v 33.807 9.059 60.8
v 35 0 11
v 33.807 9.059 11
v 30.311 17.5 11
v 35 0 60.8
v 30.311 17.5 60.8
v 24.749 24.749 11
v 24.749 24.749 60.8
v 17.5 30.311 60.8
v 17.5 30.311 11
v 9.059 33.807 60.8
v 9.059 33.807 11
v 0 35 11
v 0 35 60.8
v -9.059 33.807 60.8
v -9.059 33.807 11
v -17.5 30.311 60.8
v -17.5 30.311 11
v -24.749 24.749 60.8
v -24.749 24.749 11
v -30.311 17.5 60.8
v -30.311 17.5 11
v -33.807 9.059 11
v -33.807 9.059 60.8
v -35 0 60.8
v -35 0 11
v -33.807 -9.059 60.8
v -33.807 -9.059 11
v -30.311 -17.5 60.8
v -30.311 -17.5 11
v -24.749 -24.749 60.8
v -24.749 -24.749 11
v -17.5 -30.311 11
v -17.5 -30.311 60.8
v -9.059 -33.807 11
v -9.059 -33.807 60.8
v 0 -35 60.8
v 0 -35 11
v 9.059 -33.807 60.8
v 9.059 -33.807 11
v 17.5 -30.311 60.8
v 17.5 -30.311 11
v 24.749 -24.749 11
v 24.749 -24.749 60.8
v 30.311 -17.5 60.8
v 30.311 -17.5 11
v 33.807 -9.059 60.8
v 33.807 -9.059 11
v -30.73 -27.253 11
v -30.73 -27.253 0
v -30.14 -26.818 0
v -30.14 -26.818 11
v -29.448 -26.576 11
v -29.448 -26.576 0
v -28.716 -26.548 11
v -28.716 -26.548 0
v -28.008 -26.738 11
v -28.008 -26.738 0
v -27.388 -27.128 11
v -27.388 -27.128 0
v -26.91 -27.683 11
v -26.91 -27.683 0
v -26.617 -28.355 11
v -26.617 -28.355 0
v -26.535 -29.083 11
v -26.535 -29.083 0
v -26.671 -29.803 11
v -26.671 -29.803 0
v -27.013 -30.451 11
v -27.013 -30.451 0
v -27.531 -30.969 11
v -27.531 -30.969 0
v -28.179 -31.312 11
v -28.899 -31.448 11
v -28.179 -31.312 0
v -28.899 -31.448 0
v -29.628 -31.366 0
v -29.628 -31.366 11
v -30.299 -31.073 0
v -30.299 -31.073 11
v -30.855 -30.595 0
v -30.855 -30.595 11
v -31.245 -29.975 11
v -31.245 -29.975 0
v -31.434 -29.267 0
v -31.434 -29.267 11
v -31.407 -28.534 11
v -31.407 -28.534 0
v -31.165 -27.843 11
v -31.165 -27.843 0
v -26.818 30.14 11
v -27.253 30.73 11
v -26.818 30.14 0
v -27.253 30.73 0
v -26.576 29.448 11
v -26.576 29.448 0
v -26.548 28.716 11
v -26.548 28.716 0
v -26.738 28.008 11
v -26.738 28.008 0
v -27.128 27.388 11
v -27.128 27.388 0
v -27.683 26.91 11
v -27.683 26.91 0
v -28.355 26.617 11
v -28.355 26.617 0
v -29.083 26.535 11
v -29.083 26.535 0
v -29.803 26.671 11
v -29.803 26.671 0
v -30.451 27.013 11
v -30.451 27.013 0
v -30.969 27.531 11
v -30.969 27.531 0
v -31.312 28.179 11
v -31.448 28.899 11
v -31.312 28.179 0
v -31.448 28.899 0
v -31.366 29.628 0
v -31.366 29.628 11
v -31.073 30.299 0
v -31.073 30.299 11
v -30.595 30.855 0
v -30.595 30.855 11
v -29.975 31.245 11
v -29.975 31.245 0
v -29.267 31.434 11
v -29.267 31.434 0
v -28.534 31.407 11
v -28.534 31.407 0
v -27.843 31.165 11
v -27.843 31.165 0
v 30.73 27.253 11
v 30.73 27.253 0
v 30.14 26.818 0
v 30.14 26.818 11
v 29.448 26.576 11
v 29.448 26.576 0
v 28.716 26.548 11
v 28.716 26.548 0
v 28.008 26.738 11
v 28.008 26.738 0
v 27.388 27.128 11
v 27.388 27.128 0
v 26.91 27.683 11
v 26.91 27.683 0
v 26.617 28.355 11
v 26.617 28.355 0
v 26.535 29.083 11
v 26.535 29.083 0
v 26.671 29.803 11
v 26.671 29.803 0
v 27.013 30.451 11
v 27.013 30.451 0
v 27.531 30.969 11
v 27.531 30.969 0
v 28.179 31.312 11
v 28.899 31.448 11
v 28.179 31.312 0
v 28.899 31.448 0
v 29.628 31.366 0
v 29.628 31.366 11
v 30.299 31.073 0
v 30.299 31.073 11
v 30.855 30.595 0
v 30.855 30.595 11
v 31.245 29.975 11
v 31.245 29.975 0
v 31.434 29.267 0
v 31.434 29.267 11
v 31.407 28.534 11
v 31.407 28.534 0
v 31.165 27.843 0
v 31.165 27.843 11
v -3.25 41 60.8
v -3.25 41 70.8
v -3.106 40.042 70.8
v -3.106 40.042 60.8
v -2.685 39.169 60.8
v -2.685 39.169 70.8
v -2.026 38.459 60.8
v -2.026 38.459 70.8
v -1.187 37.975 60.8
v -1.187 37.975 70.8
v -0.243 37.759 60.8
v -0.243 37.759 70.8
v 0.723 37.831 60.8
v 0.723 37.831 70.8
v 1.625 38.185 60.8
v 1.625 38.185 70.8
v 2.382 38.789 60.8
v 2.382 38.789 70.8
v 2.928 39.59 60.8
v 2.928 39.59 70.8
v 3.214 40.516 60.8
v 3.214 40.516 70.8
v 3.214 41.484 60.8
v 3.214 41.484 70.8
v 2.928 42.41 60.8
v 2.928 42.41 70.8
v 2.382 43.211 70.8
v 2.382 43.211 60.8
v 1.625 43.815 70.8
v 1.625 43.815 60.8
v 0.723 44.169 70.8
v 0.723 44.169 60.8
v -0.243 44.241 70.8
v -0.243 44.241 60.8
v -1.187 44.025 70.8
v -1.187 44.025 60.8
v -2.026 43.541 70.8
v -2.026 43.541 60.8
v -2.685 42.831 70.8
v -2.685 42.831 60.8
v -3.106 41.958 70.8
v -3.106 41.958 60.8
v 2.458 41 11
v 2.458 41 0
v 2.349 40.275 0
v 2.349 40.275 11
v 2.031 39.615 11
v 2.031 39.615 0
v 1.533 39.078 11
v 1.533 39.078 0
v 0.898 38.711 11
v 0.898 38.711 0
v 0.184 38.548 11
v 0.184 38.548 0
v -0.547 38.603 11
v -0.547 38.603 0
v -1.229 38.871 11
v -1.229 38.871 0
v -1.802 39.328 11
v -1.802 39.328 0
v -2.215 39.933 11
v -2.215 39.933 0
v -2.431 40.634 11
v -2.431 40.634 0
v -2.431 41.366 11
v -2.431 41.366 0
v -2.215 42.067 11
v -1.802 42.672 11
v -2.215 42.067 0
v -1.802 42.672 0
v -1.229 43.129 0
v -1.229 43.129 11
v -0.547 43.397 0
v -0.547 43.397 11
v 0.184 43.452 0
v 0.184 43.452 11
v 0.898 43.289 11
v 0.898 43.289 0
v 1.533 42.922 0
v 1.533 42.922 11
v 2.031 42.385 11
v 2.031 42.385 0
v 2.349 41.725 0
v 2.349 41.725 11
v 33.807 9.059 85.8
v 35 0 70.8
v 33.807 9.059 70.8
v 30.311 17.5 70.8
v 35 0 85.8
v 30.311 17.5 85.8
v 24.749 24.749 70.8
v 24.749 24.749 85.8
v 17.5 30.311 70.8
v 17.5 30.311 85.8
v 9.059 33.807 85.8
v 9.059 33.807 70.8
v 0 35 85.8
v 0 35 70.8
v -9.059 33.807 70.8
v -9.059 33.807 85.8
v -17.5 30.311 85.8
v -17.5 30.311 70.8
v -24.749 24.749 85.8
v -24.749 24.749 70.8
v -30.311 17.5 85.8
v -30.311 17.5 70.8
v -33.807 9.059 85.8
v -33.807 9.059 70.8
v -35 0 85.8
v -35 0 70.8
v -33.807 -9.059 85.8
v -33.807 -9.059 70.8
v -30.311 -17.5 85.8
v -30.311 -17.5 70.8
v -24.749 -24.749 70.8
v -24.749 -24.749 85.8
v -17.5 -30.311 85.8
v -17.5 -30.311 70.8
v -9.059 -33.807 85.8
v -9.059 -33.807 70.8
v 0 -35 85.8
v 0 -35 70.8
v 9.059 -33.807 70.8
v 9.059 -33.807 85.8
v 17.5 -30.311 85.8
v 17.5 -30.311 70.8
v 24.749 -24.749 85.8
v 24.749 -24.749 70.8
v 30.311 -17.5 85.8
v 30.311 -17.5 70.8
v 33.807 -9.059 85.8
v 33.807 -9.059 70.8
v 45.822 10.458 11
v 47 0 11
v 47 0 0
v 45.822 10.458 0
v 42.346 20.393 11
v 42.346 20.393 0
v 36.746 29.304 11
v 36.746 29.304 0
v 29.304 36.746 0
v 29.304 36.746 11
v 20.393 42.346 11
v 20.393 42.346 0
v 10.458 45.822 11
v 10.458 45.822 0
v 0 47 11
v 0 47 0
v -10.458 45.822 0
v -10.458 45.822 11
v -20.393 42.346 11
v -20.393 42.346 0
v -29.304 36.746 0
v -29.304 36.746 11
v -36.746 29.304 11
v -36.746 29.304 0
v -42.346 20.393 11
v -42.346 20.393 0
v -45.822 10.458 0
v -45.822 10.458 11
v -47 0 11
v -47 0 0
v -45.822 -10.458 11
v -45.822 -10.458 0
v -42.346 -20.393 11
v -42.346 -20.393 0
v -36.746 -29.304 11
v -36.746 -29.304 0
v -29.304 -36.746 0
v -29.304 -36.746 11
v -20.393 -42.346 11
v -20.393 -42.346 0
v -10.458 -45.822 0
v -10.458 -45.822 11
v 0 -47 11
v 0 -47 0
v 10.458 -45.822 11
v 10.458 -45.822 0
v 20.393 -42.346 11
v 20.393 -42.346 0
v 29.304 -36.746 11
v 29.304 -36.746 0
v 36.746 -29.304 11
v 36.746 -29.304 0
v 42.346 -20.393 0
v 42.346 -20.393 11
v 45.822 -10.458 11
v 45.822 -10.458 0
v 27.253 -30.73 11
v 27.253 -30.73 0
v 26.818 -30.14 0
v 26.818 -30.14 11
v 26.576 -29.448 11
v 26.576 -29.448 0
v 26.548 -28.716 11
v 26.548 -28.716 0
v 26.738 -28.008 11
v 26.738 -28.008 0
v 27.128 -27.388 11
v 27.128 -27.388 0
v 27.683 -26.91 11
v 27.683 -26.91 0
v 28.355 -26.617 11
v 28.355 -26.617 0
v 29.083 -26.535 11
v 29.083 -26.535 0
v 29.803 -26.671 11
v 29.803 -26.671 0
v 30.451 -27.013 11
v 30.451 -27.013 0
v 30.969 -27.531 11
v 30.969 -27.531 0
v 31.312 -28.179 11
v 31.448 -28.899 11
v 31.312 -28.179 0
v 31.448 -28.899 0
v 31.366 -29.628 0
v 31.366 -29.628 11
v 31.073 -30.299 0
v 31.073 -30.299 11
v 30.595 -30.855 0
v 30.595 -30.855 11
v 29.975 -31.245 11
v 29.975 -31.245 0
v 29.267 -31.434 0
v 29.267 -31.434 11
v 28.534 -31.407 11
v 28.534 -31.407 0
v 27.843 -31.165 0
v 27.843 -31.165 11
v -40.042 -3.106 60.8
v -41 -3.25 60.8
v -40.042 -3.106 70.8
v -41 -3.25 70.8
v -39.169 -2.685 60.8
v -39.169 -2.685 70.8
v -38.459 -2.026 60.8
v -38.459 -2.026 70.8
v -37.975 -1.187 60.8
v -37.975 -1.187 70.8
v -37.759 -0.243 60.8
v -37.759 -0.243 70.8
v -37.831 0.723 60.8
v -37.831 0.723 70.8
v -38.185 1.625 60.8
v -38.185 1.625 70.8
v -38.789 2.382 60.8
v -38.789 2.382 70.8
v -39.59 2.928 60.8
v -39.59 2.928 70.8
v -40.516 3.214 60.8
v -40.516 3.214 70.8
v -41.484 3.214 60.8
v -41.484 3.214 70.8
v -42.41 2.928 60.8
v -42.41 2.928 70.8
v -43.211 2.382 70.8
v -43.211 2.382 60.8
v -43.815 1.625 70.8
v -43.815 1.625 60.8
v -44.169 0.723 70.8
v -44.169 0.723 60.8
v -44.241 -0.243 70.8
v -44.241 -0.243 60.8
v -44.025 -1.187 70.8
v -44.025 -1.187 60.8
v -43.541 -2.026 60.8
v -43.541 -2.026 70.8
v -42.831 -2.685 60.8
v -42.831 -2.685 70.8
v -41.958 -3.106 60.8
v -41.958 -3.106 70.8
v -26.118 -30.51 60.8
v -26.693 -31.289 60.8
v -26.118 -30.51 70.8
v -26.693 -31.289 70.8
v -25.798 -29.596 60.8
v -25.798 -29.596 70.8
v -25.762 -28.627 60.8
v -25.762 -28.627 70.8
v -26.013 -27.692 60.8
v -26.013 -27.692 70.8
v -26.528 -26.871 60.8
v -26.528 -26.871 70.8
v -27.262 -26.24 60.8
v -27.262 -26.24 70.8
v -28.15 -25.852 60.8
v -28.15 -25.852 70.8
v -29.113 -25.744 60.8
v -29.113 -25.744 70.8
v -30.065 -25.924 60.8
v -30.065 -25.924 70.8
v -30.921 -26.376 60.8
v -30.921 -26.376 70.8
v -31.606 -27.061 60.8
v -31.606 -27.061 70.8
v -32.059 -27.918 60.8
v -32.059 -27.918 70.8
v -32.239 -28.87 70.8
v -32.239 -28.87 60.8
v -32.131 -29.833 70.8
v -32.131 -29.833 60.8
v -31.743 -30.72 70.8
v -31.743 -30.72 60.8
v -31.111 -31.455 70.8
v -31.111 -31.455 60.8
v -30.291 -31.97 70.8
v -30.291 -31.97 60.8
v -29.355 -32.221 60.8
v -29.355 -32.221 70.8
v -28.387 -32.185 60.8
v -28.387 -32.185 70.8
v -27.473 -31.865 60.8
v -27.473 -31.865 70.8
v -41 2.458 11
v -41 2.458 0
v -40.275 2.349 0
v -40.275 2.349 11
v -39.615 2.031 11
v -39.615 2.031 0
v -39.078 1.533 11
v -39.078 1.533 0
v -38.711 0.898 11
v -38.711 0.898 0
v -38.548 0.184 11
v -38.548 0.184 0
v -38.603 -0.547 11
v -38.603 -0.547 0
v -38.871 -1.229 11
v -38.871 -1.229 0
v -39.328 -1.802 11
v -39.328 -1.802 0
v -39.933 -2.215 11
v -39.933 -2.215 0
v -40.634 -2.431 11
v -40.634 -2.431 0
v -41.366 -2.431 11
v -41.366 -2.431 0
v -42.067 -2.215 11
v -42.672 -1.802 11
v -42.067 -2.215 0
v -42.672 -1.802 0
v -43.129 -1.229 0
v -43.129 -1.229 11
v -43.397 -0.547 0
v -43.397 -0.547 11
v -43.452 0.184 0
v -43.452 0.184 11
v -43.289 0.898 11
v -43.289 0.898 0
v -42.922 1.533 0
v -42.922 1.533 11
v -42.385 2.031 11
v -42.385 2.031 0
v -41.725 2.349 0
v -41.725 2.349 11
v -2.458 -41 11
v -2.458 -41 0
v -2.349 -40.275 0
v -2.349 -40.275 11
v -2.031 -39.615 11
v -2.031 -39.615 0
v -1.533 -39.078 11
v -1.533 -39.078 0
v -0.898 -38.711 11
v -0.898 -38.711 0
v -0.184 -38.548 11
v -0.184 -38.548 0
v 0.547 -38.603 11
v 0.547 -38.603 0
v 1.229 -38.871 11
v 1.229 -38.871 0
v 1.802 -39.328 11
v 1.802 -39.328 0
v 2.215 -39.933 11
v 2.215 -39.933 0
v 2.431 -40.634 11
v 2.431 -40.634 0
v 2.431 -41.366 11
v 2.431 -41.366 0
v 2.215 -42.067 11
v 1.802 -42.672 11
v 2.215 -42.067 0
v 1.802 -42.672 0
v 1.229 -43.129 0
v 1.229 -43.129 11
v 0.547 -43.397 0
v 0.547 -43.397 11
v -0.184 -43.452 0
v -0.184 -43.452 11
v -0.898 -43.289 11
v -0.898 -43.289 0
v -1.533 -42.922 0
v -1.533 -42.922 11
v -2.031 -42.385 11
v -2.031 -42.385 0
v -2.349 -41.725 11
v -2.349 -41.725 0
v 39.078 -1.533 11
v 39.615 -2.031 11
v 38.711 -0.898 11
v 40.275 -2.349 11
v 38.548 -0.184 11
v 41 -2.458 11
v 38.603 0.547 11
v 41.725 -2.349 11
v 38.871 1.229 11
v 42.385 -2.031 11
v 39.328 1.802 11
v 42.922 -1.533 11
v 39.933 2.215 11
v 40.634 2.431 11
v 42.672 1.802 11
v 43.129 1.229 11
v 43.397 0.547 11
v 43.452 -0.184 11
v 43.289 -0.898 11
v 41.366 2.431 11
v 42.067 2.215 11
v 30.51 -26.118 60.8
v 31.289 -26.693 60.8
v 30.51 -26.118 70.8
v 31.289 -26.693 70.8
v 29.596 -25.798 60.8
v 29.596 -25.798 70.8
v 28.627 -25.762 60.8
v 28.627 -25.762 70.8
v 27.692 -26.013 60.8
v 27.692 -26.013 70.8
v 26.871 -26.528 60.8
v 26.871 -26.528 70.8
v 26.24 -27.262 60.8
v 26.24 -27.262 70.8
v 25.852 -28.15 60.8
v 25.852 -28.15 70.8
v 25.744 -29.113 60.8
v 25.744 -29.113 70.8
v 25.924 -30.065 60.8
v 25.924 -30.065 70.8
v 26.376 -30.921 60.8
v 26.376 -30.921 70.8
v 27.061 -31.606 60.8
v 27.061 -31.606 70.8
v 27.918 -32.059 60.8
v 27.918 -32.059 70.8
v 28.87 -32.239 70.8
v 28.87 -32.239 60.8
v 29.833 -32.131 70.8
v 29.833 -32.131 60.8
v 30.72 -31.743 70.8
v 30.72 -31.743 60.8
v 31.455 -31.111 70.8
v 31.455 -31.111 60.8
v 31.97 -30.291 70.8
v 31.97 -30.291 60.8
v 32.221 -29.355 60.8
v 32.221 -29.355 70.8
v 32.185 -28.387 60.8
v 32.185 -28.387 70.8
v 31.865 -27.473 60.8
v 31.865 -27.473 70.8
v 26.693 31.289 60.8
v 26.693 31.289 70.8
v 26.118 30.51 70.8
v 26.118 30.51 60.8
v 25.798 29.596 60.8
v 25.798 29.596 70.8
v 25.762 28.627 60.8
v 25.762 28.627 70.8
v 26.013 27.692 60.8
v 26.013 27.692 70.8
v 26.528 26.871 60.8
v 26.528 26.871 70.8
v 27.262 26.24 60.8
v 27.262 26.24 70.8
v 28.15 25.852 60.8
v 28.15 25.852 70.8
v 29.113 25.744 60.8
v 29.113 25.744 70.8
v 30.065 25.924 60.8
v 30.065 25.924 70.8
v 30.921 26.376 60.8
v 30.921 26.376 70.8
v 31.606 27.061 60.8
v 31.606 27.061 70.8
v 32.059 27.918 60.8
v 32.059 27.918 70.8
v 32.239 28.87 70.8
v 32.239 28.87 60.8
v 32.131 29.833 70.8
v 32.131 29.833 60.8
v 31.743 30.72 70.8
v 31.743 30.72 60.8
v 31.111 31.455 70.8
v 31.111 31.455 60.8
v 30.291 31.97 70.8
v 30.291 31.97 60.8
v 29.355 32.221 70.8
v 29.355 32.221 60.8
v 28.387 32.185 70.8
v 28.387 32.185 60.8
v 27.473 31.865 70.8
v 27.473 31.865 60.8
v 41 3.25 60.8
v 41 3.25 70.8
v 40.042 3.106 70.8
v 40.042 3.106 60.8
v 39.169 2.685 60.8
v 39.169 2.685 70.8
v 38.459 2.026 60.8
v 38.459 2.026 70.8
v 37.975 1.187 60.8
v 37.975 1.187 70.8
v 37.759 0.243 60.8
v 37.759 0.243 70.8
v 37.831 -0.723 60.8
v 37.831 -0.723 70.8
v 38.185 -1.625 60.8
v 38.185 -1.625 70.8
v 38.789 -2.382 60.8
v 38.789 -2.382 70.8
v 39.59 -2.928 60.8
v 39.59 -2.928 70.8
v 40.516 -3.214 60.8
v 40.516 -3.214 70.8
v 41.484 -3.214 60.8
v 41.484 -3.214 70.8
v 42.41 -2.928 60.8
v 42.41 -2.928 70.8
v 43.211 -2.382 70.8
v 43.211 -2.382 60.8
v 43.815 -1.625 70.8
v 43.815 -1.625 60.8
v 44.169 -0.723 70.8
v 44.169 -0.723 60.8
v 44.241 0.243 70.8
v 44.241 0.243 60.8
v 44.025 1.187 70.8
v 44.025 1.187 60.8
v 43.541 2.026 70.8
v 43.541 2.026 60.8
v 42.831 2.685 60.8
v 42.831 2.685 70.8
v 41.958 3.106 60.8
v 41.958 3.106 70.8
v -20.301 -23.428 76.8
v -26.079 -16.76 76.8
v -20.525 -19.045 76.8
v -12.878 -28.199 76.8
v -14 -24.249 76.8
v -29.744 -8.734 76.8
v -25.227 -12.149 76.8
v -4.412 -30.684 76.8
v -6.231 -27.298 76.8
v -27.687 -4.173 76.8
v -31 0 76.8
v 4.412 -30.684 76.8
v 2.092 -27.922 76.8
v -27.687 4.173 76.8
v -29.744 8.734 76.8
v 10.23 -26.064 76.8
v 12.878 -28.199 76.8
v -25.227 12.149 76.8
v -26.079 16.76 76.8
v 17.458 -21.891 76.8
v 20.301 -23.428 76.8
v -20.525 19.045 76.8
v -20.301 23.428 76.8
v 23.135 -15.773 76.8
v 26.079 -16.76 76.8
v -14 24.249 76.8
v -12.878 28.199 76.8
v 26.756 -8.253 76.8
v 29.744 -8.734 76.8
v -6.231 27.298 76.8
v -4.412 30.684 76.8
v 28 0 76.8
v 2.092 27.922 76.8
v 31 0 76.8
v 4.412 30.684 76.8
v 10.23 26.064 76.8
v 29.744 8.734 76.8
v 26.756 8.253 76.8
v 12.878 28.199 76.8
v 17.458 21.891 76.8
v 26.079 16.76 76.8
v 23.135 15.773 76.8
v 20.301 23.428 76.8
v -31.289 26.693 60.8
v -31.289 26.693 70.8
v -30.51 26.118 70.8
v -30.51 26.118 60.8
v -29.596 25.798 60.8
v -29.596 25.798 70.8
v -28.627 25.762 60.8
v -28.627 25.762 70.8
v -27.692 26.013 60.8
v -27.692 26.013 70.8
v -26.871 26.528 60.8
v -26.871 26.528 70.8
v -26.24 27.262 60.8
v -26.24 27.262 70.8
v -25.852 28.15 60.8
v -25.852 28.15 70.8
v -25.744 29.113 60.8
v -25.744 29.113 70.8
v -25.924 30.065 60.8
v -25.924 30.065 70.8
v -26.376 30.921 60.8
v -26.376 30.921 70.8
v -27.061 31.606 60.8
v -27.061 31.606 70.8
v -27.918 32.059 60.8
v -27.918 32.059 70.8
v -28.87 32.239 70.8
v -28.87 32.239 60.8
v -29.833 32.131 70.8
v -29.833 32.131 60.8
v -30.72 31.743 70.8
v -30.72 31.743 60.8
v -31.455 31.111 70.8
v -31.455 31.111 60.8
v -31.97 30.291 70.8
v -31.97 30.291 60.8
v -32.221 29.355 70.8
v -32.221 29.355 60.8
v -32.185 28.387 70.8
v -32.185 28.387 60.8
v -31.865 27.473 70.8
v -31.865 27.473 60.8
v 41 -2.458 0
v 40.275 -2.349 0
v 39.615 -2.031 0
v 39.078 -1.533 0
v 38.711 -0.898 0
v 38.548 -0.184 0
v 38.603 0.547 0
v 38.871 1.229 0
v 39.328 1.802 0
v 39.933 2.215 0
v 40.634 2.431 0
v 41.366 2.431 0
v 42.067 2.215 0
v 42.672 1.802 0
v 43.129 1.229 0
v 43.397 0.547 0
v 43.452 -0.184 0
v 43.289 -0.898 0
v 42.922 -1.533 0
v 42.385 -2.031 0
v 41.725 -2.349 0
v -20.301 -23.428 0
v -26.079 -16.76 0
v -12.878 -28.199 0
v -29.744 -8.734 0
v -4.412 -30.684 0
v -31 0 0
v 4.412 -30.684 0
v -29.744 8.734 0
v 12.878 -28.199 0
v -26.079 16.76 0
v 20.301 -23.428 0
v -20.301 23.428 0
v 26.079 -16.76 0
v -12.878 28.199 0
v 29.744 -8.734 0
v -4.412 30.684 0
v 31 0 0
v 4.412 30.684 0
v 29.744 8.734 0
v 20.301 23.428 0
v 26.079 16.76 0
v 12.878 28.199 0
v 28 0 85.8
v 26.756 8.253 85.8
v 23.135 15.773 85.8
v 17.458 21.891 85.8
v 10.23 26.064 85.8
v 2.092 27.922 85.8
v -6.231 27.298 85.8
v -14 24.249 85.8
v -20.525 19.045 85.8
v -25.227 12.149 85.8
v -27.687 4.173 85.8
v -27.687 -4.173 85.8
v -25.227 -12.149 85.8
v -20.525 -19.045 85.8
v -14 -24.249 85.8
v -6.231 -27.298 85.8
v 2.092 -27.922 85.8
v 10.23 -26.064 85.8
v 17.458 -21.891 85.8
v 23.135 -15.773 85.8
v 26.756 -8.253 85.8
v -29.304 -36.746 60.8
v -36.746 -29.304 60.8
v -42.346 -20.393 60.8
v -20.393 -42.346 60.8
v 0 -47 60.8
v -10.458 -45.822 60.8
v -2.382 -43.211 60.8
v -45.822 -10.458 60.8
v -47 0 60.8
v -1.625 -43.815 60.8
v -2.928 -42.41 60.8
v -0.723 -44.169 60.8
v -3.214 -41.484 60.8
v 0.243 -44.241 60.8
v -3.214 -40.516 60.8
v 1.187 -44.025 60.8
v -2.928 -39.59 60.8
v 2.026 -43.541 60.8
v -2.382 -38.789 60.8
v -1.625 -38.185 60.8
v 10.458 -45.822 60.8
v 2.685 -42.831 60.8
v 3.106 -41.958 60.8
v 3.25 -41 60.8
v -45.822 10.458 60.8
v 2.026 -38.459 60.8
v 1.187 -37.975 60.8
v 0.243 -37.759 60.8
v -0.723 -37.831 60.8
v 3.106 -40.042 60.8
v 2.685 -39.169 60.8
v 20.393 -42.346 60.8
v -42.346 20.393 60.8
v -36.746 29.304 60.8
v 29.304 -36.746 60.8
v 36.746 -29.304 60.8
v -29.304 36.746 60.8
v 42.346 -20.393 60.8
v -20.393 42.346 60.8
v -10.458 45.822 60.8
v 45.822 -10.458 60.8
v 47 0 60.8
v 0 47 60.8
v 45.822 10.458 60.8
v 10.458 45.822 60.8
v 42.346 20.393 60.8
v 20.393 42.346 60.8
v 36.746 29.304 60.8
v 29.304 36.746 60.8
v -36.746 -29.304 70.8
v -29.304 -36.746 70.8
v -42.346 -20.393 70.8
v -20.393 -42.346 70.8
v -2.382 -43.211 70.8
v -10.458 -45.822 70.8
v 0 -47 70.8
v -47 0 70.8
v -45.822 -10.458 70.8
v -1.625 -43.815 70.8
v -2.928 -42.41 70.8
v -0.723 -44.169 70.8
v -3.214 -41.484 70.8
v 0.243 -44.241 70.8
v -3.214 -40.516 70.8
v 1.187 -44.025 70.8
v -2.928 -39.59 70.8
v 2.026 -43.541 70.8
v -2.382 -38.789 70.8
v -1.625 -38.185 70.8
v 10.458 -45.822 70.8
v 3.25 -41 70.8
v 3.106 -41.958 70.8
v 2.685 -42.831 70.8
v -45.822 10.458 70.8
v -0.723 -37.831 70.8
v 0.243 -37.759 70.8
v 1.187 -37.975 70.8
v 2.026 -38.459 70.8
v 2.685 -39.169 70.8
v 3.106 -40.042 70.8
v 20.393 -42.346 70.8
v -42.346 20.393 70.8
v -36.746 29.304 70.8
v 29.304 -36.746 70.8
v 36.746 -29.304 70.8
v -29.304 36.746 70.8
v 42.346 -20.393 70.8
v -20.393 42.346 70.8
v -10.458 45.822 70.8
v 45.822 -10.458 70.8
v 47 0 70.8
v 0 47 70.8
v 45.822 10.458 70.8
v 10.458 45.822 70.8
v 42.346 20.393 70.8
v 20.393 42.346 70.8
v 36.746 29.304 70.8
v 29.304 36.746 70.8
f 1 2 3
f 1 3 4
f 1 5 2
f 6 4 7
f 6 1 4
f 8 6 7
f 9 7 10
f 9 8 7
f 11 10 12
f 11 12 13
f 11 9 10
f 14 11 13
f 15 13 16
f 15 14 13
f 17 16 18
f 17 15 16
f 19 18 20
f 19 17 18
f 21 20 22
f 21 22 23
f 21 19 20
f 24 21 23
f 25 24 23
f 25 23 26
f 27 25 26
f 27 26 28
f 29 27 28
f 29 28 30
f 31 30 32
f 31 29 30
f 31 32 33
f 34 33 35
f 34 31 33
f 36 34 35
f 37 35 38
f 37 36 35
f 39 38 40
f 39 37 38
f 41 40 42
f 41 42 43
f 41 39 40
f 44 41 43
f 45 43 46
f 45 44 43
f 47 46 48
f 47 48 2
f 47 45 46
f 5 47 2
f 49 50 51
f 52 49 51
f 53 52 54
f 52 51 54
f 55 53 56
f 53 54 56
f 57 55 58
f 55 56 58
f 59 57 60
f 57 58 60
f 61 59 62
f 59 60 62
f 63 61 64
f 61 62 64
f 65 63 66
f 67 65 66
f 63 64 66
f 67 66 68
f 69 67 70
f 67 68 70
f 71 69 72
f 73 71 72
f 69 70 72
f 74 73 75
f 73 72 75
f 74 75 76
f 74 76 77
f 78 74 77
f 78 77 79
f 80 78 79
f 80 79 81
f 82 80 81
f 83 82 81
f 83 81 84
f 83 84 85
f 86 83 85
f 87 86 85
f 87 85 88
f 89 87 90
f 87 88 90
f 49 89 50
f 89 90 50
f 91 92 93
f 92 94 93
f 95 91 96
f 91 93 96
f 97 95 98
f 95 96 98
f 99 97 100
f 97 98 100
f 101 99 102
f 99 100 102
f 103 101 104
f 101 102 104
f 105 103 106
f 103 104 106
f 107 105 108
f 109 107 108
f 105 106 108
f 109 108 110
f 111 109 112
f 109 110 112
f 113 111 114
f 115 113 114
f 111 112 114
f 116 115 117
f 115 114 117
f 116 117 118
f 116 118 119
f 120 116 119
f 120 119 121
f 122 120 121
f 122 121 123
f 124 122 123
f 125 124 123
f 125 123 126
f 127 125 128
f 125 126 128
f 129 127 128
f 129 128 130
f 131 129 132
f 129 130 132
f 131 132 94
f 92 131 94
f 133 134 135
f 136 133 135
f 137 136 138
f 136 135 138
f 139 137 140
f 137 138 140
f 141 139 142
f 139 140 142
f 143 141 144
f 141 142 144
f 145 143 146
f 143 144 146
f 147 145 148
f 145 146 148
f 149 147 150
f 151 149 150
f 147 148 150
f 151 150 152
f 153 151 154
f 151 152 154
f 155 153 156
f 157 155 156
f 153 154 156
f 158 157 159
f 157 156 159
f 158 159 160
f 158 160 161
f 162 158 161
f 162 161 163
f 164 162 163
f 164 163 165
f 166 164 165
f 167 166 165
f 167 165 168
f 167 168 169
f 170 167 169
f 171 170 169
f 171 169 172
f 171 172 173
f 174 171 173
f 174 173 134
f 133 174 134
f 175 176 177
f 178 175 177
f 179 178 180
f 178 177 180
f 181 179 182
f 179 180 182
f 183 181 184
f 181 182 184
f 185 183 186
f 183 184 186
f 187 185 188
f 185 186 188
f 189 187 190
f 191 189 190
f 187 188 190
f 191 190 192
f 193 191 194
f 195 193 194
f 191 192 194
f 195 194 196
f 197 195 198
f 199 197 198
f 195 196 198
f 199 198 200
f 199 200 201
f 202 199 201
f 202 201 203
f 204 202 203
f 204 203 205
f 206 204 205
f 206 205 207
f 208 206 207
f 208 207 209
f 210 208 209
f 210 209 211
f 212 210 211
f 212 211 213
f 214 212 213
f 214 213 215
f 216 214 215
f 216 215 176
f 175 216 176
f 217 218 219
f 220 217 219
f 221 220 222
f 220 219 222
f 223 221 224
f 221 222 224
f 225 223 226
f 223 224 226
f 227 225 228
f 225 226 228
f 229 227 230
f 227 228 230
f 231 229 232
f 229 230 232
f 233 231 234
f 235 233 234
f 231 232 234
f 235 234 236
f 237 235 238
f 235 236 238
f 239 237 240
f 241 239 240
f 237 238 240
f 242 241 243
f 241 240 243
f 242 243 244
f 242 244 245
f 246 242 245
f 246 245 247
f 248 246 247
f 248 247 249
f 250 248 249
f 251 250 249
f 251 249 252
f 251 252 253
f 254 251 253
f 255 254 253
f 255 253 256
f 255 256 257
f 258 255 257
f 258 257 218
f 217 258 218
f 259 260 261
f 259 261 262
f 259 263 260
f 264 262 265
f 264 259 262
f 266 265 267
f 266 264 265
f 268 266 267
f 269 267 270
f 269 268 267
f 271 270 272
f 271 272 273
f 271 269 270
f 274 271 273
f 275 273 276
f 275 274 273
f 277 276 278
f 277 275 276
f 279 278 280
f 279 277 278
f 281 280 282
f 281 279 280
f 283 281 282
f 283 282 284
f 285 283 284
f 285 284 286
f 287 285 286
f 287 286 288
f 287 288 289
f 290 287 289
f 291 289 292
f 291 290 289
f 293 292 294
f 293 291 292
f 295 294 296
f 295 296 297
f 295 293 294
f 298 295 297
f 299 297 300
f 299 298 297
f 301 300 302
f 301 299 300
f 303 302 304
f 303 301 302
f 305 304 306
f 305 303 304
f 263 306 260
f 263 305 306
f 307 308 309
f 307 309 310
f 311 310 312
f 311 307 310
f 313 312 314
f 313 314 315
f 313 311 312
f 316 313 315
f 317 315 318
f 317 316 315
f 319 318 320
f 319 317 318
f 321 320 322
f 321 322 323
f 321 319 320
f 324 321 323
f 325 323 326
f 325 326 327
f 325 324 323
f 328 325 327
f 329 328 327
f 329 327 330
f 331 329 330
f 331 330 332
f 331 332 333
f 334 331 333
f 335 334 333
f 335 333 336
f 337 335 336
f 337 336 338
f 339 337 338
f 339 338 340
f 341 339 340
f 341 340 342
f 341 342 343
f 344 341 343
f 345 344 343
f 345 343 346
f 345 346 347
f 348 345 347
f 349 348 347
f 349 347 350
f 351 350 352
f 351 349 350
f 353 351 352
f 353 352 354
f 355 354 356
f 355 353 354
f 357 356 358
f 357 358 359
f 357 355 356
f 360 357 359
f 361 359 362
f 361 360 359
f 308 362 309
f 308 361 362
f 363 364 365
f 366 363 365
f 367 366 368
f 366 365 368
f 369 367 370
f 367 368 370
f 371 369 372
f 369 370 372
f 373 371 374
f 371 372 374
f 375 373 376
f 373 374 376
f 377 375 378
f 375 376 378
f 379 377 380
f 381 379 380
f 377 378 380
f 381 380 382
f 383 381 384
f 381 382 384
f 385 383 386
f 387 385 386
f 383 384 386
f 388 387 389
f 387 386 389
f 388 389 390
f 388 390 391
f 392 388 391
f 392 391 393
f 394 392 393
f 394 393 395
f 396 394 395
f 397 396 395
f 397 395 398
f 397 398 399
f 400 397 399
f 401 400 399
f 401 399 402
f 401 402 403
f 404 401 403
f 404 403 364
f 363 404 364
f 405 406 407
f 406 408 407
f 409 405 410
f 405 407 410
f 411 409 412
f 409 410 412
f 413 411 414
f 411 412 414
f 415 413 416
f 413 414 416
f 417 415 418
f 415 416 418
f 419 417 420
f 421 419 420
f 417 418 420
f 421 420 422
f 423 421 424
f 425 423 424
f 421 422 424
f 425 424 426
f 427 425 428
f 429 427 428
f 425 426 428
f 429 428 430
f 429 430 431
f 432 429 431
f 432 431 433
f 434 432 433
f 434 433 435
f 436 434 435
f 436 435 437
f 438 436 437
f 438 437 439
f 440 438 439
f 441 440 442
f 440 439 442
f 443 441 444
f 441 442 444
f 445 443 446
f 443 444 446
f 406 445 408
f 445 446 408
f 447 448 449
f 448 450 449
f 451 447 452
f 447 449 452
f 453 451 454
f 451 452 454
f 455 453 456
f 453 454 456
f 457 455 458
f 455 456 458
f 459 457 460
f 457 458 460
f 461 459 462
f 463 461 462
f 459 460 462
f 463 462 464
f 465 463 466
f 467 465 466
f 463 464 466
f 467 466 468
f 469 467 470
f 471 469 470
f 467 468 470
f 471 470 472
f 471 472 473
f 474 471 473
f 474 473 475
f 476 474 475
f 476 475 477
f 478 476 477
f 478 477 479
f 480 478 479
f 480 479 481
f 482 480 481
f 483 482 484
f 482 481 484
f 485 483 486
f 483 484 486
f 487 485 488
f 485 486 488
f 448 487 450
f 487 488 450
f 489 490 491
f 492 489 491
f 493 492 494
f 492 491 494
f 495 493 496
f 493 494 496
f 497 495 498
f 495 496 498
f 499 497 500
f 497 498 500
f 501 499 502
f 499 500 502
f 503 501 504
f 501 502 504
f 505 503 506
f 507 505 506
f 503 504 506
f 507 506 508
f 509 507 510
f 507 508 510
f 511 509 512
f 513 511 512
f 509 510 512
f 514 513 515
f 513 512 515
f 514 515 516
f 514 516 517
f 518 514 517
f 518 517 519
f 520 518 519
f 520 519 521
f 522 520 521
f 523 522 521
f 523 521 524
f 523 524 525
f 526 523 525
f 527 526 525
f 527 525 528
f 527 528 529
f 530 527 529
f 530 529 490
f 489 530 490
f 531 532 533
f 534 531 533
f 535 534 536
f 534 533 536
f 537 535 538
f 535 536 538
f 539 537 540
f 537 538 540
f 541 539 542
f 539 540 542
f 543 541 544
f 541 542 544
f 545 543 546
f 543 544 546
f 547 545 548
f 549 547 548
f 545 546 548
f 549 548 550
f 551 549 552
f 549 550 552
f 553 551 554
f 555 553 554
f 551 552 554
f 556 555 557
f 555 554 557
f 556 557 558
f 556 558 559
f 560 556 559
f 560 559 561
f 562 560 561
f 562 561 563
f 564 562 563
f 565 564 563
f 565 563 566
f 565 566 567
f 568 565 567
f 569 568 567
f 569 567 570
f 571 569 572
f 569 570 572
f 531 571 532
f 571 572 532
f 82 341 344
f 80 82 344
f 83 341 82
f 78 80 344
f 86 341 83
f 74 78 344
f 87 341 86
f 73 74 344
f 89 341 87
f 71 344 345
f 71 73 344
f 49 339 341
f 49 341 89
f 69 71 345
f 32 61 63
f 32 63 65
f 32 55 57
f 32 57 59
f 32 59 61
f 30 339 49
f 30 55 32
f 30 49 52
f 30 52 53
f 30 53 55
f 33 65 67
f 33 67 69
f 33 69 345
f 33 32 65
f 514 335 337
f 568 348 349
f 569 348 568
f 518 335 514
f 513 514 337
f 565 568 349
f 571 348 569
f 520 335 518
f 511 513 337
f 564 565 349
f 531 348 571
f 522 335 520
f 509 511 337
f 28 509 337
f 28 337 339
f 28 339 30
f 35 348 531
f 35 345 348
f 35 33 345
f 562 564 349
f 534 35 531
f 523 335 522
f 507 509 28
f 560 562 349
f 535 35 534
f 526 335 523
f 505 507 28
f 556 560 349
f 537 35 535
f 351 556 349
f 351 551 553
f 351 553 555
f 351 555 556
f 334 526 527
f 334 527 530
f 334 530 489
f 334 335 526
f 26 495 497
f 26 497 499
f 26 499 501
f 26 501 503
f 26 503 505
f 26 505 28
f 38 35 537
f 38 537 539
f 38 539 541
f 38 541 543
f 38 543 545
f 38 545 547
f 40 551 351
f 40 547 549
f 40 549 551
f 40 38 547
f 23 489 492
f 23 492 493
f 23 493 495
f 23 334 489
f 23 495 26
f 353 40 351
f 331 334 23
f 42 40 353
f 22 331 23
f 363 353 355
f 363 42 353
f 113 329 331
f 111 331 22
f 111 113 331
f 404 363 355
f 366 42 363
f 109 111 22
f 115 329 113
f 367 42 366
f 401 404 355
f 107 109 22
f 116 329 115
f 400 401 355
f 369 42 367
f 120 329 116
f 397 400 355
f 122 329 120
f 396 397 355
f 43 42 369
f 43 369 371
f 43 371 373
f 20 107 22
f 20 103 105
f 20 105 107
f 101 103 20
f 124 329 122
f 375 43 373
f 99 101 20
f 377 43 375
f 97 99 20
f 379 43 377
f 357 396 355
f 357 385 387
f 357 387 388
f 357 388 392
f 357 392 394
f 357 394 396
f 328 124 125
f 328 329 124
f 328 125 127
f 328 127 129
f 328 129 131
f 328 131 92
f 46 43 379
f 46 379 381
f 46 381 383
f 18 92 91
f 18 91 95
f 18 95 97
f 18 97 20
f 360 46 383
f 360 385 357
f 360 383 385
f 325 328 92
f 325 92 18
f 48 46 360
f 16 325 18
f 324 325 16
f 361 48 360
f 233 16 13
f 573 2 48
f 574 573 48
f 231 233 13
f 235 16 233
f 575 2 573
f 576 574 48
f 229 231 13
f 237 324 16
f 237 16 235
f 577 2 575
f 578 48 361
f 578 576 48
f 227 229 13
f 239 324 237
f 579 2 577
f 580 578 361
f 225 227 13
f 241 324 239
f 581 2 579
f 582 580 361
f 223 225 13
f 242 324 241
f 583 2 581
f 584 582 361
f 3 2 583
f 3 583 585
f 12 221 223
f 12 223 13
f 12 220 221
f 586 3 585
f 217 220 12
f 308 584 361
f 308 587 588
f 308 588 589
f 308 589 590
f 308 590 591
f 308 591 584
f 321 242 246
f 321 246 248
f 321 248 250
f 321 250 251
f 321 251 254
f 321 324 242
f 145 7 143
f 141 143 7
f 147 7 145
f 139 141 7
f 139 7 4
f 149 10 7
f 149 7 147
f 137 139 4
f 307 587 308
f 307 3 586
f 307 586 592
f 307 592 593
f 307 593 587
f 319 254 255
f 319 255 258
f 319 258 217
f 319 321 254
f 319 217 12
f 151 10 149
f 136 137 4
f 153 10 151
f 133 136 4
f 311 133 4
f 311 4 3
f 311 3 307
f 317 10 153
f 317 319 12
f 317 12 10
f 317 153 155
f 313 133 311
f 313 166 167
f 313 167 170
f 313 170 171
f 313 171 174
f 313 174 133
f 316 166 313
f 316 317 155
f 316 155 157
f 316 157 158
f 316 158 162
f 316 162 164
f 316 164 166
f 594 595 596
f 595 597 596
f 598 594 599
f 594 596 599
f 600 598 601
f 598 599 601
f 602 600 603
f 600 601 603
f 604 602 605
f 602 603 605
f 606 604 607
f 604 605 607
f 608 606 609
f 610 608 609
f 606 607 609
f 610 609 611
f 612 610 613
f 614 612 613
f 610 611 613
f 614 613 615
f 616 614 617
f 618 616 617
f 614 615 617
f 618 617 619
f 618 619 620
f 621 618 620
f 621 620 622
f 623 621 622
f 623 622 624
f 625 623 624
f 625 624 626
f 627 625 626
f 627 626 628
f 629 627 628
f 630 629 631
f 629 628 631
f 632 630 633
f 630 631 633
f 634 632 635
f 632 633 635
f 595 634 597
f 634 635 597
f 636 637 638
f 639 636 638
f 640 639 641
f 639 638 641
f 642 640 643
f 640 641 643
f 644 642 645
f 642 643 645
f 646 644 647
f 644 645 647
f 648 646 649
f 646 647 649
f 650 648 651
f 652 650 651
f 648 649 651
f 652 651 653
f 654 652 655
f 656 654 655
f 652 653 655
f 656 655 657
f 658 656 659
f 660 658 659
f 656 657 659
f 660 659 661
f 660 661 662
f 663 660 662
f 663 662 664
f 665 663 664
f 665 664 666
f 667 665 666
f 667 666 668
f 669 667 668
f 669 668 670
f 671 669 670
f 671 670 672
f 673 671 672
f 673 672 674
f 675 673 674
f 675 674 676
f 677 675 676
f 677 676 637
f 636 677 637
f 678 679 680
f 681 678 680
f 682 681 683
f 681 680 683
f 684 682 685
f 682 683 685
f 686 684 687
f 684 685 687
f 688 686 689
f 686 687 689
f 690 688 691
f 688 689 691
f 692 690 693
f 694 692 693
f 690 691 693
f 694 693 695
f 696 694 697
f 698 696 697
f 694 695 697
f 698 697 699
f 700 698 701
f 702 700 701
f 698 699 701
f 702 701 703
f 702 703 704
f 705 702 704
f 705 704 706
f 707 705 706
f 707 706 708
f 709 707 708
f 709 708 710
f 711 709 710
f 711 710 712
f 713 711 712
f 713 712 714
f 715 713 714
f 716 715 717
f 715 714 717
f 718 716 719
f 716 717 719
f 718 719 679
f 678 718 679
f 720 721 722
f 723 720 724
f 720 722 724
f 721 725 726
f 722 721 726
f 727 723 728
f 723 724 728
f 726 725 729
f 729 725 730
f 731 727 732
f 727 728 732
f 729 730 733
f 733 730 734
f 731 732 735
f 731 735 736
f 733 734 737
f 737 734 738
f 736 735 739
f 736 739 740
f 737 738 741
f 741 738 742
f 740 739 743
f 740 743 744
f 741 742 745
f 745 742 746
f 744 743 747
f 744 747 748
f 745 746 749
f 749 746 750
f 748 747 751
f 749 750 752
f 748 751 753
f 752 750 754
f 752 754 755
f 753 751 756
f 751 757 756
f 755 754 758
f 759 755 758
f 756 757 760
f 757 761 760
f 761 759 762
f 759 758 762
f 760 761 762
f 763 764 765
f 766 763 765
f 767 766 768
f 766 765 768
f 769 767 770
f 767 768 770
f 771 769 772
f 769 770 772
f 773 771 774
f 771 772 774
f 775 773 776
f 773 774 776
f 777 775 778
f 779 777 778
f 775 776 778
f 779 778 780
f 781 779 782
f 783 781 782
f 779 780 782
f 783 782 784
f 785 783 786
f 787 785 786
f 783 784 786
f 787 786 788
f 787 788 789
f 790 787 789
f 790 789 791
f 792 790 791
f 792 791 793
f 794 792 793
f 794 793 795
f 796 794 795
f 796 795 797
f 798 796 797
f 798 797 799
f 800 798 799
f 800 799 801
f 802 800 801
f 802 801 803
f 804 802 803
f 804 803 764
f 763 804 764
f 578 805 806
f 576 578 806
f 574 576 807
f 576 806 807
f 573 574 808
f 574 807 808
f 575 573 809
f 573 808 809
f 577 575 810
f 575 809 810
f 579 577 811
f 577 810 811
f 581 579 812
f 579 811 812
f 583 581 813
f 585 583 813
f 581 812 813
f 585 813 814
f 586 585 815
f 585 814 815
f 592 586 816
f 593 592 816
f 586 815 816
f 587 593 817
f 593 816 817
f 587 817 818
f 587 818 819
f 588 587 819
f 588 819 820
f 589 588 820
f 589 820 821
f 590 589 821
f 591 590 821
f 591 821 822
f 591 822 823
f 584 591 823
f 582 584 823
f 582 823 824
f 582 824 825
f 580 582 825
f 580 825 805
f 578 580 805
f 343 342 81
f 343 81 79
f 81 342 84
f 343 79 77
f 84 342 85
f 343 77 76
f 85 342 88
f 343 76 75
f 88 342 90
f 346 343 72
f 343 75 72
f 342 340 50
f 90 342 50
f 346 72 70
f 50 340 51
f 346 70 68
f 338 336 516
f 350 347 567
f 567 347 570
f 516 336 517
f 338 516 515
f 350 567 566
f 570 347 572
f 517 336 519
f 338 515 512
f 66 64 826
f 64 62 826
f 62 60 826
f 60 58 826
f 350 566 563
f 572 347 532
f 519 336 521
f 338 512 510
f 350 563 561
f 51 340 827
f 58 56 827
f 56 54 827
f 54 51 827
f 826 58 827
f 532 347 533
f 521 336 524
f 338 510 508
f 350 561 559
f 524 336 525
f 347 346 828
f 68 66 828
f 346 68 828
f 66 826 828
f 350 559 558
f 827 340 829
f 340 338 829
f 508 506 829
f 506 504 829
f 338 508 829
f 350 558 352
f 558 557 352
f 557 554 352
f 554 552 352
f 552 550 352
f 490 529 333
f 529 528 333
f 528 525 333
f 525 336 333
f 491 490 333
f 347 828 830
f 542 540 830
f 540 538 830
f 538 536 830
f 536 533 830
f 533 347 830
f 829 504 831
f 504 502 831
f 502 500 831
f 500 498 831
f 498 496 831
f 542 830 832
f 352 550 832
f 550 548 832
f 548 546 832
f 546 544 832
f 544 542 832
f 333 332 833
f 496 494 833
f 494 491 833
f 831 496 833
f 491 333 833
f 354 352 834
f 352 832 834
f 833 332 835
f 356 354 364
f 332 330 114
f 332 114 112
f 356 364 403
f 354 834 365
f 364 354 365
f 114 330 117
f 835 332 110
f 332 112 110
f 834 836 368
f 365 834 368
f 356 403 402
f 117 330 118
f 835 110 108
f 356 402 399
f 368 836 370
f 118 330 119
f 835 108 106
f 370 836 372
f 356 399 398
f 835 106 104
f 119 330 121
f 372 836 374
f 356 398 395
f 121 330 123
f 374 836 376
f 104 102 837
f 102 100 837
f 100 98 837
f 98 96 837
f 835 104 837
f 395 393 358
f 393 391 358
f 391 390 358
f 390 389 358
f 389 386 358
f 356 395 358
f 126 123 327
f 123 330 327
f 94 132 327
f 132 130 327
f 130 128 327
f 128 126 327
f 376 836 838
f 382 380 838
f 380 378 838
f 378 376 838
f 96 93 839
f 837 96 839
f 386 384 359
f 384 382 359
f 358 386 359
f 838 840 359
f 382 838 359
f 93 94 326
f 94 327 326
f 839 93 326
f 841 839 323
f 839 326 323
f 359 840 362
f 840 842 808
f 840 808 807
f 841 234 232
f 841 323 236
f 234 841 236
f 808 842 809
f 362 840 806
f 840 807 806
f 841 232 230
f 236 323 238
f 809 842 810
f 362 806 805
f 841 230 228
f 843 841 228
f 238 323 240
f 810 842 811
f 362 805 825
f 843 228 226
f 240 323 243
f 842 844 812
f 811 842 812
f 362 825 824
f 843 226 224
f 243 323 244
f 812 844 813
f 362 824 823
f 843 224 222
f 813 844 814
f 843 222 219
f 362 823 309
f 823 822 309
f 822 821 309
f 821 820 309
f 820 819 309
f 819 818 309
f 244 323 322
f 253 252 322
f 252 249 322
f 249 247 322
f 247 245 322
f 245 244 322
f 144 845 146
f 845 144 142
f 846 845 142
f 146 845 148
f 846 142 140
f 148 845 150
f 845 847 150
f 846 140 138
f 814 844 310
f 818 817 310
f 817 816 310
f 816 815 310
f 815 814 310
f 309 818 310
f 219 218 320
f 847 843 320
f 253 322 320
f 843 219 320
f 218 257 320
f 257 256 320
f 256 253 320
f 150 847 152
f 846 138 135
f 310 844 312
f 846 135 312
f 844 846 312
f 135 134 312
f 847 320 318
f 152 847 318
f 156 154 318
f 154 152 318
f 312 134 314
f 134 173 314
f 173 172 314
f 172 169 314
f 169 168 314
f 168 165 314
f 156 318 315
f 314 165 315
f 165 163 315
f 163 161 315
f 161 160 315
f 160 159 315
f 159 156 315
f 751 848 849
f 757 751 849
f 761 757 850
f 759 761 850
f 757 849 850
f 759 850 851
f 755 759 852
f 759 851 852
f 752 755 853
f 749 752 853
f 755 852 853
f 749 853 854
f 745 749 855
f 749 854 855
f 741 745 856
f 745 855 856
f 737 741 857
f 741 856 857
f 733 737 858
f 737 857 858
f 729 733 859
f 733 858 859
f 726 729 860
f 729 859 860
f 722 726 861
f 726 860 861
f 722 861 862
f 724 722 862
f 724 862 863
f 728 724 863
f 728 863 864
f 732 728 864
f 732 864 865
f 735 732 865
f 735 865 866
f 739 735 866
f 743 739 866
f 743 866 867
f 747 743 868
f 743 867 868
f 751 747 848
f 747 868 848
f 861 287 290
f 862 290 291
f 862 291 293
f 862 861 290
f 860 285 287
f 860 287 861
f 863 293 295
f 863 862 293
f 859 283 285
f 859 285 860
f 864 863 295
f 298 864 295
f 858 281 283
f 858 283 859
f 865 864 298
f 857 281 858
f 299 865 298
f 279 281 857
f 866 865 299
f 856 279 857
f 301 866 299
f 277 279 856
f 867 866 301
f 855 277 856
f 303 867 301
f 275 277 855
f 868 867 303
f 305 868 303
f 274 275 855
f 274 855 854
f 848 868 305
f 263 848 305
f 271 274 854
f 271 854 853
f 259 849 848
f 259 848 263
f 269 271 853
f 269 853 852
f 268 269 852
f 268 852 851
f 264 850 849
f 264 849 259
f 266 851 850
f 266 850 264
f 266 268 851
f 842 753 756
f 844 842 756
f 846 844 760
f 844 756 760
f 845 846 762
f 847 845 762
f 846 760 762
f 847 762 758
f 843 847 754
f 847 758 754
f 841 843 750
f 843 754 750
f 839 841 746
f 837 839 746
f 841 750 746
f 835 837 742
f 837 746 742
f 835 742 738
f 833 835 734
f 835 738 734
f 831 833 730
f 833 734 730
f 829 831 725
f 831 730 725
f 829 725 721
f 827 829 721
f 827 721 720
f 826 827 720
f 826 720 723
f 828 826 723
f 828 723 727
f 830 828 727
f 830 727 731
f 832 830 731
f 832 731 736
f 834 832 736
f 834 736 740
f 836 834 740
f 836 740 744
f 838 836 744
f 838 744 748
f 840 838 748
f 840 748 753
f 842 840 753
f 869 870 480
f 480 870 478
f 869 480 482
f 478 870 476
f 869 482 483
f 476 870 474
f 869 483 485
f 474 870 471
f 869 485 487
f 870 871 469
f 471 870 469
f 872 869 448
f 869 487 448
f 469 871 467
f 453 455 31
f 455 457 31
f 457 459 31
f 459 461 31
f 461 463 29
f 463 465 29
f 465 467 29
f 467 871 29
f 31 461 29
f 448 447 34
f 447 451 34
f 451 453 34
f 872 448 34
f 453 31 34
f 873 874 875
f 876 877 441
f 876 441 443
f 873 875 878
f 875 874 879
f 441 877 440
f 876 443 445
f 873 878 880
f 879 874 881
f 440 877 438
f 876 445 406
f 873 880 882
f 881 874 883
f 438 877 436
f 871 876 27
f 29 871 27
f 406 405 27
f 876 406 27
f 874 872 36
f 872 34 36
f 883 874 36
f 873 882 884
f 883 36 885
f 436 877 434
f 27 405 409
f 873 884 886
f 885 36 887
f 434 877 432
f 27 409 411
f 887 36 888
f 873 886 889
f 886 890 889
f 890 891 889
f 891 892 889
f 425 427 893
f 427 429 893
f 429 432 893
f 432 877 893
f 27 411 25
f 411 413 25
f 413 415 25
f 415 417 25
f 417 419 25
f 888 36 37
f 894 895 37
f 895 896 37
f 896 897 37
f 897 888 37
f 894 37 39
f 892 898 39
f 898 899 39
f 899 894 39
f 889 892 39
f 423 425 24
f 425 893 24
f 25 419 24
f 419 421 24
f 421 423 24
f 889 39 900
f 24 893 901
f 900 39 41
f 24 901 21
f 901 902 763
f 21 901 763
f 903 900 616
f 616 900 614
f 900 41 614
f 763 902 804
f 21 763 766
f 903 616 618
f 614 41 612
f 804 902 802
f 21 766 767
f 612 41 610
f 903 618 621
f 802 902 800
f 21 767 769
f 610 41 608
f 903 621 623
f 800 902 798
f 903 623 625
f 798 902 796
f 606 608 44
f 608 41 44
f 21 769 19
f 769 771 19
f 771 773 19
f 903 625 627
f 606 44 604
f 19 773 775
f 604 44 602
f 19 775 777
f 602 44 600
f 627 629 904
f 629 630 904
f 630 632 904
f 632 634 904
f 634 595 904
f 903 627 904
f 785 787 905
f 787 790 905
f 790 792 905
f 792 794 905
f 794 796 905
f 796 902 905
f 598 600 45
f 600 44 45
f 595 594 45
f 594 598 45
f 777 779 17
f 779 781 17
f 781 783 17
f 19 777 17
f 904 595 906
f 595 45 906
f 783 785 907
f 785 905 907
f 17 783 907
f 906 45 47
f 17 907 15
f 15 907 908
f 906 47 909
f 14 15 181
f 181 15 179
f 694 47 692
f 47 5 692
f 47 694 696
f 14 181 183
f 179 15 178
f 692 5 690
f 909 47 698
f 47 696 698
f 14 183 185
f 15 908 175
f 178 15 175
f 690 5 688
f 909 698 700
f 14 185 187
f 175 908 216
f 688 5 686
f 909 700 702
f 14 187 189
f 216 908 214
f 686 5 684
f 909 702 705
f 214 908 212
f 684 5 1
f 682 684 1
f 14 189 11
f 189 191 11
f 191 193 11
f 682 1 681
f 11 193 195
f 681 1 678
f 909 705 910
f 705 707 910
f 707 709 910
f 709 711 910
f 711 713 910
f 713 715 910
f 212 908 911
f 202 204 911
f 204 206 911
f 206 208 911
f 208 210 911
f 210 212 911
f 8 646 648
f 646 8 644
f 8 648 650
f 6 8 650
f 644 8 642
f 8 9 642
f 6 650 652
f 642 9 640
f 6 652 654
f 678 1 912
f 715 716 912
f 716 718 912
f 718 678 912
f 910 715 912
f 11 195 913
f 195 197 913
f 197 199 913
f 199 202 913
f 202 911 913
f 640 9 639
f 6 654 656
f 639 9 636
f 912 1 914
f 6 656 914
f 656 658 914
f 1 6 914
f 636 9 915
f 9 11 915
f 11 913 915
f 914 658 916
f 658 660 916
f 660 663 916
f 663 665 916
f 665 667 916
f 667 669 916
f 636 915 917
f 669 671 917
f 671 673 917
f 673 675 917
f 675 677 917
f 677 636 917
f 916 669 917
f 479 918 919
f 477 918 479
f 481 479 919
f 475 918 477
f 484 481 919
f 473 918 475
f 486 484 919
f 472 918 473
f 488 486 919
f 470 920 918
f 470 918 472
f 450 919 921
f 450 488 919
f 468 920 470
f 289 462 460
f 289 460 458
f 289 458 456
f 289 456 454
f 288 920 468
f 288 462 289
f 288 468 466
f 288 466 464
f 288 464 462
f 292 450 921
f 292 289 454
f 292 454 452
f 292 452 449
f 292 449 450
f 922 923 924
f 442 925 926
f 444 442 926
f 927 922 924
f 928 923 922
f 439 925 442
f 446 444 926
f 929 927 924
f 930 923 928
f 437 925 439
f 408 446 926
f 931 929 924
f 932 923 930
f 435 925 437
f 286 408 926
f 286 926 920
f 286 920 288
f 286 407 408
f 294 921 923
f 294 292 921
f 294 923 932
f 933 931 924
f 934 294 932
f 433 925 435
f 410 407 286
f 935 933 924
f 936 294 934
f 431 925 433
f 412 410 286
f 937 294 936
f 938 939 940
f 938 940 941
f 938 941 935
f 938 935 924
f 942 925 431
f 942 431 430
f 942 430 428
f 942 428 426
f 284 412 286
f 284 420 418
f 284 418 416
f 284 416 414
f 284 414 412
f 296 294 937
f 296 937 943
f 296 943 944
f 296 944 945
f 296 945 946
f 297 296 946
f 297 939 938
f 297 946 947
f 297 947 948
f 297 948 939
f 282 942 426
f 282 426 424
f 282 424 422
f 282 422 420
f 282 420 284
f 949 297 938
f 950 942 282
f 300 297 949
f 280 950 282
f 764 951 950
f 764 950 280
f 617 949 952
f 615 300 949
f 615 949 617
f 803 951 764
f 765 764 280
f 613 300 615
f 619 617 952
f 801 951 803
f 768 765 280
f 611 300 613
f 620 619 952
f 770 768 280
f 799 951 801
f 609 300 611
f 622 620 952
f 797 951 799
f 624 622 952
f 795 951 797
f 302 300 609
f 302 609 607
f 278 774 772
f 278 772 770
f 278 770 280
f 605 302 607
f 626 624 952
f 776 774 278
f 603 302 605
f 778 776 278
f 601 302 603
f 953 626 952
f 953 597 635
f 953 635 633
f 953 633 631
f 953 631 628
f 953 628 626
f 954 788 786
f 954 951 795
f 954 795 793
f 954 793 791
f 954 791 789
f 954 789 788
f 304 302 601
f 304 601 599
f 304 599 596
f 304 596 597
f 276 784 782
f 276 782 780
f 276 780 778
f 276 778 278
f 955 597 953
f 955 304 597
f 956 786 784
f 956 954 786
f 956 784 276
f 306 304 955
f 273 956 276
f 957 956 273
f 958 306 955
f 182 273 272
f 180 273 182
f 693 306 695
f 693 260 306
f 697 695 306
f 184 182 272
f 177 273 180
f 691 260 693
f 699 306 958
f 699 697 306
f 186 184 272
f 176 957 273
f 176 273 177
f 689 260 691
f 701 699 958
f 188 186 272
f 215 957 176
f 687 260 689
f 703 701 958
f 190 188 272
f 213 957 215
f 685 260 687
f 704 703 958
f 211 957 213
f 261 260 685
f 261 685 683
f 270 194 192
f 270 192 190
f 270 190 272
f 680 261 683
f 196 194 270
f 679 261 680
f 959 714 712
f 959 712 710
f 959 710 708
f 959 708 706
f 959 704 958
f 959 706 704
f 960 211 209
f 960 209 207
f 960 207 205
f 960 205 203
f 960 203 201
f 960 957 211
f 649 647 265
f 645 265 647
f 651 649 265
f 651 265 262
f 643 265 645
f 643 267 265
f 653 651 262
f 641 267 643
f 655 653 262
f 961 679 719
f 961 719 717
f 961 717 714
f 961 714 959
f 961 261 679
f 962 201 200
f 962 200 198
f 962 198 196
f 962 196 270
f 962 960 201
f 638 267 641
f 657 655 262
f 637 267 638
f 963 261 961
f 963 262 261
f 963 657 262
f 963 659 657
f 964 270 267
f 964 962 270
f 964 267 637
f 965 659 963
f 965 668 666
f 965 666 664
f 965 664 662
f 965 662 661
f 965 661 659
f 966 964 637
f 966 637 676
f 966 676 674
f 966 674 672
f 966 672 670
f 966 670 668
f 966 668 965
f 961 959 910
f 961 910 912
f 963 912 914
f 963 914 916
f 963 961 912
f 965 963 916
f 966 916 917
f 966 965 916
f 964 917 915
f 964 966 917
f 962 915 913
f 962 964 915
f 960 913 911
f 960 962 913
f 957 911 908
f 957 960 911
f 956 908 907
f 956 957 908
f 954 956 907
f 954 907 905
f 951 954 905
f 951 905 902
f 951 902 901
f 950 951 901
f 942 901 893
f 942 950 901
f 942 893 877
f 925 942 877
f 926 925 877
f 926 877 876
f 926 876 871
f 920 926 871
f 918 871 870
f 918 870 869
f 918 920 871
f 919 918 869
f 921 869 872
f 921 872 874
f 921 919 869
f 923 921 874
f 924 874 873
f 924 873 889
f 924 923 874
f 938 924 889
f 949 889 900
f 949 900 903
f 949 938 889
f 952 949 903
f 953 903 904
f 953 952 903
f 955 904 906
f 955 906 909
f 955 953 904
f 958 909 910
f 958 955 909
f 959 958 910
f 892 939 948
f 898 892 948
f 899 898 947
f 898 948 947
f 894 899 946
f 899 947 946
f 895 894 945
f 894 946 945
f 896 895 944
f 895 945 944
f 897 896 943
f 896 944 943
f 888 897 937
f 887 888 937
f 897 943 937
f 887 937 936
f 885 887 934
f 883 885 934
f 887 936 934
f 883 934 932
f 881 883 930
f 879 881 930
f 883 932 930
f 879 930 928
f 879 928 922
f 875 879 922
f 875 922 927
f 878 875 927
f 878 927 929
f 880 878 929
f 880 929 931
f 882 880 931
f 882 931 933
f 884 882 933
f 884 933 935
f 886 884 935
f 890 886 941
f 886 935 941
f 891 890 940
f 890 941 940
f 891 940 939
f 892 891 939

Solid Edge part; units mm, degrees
sketch "Sketch1" plane through (0, 0, 0) normal (0, -1, 0) x (1, 0, 0)
  line L0 (47, 70.8) -> (35, 70.8)
  line L1 (35, 70.8) -> (35, 85.8)
  line L2 (28, 85.8) -> (35, 85.8)
  line L3 (28, 76.8) -> (28, 85.8)
  line L4 (31, 76.8) -> (28, 76.8)
  line L5 (31, 0) -> (31, 76.8)
  line L6 (31, 0) -> (47, 0)
  line L7 (47, 0) -> (47, 11)
  line L8 (47, 11) -> (35, 11)
  line L9 (35, 11) -> (35, 60.8)
  line L10 (35, 60.8) -> (47, 60.8)
  line L11 (47, 60.8) -> (47, 70.8)
revolve "RevolvedProtrusion1" add sketch "Sketch1" angle 360 about axis through (0, 0, 0) along (0, 0, 1)
hole "Hole1" at (-41, 0, 70.8) direction (0, 0, -1) diameter 6.5 end up to next
pattern_circular "Pattern1" count 8 over 360 about axis through (0, 0, 70.8) along (0, 0, -1) of "Hole1"
hole "Agujero_3" at (-41, 0, 0) direction (0, 0, 1) diameter 4.917 end through all
pattern_circular "Pattern3" count 8 over 360 about axis through (0, 0, 0) along (0, 0, 1) of "Agujero_3"
properties part number "1976-1100-006" material "Aluminio, 7075-T6"
